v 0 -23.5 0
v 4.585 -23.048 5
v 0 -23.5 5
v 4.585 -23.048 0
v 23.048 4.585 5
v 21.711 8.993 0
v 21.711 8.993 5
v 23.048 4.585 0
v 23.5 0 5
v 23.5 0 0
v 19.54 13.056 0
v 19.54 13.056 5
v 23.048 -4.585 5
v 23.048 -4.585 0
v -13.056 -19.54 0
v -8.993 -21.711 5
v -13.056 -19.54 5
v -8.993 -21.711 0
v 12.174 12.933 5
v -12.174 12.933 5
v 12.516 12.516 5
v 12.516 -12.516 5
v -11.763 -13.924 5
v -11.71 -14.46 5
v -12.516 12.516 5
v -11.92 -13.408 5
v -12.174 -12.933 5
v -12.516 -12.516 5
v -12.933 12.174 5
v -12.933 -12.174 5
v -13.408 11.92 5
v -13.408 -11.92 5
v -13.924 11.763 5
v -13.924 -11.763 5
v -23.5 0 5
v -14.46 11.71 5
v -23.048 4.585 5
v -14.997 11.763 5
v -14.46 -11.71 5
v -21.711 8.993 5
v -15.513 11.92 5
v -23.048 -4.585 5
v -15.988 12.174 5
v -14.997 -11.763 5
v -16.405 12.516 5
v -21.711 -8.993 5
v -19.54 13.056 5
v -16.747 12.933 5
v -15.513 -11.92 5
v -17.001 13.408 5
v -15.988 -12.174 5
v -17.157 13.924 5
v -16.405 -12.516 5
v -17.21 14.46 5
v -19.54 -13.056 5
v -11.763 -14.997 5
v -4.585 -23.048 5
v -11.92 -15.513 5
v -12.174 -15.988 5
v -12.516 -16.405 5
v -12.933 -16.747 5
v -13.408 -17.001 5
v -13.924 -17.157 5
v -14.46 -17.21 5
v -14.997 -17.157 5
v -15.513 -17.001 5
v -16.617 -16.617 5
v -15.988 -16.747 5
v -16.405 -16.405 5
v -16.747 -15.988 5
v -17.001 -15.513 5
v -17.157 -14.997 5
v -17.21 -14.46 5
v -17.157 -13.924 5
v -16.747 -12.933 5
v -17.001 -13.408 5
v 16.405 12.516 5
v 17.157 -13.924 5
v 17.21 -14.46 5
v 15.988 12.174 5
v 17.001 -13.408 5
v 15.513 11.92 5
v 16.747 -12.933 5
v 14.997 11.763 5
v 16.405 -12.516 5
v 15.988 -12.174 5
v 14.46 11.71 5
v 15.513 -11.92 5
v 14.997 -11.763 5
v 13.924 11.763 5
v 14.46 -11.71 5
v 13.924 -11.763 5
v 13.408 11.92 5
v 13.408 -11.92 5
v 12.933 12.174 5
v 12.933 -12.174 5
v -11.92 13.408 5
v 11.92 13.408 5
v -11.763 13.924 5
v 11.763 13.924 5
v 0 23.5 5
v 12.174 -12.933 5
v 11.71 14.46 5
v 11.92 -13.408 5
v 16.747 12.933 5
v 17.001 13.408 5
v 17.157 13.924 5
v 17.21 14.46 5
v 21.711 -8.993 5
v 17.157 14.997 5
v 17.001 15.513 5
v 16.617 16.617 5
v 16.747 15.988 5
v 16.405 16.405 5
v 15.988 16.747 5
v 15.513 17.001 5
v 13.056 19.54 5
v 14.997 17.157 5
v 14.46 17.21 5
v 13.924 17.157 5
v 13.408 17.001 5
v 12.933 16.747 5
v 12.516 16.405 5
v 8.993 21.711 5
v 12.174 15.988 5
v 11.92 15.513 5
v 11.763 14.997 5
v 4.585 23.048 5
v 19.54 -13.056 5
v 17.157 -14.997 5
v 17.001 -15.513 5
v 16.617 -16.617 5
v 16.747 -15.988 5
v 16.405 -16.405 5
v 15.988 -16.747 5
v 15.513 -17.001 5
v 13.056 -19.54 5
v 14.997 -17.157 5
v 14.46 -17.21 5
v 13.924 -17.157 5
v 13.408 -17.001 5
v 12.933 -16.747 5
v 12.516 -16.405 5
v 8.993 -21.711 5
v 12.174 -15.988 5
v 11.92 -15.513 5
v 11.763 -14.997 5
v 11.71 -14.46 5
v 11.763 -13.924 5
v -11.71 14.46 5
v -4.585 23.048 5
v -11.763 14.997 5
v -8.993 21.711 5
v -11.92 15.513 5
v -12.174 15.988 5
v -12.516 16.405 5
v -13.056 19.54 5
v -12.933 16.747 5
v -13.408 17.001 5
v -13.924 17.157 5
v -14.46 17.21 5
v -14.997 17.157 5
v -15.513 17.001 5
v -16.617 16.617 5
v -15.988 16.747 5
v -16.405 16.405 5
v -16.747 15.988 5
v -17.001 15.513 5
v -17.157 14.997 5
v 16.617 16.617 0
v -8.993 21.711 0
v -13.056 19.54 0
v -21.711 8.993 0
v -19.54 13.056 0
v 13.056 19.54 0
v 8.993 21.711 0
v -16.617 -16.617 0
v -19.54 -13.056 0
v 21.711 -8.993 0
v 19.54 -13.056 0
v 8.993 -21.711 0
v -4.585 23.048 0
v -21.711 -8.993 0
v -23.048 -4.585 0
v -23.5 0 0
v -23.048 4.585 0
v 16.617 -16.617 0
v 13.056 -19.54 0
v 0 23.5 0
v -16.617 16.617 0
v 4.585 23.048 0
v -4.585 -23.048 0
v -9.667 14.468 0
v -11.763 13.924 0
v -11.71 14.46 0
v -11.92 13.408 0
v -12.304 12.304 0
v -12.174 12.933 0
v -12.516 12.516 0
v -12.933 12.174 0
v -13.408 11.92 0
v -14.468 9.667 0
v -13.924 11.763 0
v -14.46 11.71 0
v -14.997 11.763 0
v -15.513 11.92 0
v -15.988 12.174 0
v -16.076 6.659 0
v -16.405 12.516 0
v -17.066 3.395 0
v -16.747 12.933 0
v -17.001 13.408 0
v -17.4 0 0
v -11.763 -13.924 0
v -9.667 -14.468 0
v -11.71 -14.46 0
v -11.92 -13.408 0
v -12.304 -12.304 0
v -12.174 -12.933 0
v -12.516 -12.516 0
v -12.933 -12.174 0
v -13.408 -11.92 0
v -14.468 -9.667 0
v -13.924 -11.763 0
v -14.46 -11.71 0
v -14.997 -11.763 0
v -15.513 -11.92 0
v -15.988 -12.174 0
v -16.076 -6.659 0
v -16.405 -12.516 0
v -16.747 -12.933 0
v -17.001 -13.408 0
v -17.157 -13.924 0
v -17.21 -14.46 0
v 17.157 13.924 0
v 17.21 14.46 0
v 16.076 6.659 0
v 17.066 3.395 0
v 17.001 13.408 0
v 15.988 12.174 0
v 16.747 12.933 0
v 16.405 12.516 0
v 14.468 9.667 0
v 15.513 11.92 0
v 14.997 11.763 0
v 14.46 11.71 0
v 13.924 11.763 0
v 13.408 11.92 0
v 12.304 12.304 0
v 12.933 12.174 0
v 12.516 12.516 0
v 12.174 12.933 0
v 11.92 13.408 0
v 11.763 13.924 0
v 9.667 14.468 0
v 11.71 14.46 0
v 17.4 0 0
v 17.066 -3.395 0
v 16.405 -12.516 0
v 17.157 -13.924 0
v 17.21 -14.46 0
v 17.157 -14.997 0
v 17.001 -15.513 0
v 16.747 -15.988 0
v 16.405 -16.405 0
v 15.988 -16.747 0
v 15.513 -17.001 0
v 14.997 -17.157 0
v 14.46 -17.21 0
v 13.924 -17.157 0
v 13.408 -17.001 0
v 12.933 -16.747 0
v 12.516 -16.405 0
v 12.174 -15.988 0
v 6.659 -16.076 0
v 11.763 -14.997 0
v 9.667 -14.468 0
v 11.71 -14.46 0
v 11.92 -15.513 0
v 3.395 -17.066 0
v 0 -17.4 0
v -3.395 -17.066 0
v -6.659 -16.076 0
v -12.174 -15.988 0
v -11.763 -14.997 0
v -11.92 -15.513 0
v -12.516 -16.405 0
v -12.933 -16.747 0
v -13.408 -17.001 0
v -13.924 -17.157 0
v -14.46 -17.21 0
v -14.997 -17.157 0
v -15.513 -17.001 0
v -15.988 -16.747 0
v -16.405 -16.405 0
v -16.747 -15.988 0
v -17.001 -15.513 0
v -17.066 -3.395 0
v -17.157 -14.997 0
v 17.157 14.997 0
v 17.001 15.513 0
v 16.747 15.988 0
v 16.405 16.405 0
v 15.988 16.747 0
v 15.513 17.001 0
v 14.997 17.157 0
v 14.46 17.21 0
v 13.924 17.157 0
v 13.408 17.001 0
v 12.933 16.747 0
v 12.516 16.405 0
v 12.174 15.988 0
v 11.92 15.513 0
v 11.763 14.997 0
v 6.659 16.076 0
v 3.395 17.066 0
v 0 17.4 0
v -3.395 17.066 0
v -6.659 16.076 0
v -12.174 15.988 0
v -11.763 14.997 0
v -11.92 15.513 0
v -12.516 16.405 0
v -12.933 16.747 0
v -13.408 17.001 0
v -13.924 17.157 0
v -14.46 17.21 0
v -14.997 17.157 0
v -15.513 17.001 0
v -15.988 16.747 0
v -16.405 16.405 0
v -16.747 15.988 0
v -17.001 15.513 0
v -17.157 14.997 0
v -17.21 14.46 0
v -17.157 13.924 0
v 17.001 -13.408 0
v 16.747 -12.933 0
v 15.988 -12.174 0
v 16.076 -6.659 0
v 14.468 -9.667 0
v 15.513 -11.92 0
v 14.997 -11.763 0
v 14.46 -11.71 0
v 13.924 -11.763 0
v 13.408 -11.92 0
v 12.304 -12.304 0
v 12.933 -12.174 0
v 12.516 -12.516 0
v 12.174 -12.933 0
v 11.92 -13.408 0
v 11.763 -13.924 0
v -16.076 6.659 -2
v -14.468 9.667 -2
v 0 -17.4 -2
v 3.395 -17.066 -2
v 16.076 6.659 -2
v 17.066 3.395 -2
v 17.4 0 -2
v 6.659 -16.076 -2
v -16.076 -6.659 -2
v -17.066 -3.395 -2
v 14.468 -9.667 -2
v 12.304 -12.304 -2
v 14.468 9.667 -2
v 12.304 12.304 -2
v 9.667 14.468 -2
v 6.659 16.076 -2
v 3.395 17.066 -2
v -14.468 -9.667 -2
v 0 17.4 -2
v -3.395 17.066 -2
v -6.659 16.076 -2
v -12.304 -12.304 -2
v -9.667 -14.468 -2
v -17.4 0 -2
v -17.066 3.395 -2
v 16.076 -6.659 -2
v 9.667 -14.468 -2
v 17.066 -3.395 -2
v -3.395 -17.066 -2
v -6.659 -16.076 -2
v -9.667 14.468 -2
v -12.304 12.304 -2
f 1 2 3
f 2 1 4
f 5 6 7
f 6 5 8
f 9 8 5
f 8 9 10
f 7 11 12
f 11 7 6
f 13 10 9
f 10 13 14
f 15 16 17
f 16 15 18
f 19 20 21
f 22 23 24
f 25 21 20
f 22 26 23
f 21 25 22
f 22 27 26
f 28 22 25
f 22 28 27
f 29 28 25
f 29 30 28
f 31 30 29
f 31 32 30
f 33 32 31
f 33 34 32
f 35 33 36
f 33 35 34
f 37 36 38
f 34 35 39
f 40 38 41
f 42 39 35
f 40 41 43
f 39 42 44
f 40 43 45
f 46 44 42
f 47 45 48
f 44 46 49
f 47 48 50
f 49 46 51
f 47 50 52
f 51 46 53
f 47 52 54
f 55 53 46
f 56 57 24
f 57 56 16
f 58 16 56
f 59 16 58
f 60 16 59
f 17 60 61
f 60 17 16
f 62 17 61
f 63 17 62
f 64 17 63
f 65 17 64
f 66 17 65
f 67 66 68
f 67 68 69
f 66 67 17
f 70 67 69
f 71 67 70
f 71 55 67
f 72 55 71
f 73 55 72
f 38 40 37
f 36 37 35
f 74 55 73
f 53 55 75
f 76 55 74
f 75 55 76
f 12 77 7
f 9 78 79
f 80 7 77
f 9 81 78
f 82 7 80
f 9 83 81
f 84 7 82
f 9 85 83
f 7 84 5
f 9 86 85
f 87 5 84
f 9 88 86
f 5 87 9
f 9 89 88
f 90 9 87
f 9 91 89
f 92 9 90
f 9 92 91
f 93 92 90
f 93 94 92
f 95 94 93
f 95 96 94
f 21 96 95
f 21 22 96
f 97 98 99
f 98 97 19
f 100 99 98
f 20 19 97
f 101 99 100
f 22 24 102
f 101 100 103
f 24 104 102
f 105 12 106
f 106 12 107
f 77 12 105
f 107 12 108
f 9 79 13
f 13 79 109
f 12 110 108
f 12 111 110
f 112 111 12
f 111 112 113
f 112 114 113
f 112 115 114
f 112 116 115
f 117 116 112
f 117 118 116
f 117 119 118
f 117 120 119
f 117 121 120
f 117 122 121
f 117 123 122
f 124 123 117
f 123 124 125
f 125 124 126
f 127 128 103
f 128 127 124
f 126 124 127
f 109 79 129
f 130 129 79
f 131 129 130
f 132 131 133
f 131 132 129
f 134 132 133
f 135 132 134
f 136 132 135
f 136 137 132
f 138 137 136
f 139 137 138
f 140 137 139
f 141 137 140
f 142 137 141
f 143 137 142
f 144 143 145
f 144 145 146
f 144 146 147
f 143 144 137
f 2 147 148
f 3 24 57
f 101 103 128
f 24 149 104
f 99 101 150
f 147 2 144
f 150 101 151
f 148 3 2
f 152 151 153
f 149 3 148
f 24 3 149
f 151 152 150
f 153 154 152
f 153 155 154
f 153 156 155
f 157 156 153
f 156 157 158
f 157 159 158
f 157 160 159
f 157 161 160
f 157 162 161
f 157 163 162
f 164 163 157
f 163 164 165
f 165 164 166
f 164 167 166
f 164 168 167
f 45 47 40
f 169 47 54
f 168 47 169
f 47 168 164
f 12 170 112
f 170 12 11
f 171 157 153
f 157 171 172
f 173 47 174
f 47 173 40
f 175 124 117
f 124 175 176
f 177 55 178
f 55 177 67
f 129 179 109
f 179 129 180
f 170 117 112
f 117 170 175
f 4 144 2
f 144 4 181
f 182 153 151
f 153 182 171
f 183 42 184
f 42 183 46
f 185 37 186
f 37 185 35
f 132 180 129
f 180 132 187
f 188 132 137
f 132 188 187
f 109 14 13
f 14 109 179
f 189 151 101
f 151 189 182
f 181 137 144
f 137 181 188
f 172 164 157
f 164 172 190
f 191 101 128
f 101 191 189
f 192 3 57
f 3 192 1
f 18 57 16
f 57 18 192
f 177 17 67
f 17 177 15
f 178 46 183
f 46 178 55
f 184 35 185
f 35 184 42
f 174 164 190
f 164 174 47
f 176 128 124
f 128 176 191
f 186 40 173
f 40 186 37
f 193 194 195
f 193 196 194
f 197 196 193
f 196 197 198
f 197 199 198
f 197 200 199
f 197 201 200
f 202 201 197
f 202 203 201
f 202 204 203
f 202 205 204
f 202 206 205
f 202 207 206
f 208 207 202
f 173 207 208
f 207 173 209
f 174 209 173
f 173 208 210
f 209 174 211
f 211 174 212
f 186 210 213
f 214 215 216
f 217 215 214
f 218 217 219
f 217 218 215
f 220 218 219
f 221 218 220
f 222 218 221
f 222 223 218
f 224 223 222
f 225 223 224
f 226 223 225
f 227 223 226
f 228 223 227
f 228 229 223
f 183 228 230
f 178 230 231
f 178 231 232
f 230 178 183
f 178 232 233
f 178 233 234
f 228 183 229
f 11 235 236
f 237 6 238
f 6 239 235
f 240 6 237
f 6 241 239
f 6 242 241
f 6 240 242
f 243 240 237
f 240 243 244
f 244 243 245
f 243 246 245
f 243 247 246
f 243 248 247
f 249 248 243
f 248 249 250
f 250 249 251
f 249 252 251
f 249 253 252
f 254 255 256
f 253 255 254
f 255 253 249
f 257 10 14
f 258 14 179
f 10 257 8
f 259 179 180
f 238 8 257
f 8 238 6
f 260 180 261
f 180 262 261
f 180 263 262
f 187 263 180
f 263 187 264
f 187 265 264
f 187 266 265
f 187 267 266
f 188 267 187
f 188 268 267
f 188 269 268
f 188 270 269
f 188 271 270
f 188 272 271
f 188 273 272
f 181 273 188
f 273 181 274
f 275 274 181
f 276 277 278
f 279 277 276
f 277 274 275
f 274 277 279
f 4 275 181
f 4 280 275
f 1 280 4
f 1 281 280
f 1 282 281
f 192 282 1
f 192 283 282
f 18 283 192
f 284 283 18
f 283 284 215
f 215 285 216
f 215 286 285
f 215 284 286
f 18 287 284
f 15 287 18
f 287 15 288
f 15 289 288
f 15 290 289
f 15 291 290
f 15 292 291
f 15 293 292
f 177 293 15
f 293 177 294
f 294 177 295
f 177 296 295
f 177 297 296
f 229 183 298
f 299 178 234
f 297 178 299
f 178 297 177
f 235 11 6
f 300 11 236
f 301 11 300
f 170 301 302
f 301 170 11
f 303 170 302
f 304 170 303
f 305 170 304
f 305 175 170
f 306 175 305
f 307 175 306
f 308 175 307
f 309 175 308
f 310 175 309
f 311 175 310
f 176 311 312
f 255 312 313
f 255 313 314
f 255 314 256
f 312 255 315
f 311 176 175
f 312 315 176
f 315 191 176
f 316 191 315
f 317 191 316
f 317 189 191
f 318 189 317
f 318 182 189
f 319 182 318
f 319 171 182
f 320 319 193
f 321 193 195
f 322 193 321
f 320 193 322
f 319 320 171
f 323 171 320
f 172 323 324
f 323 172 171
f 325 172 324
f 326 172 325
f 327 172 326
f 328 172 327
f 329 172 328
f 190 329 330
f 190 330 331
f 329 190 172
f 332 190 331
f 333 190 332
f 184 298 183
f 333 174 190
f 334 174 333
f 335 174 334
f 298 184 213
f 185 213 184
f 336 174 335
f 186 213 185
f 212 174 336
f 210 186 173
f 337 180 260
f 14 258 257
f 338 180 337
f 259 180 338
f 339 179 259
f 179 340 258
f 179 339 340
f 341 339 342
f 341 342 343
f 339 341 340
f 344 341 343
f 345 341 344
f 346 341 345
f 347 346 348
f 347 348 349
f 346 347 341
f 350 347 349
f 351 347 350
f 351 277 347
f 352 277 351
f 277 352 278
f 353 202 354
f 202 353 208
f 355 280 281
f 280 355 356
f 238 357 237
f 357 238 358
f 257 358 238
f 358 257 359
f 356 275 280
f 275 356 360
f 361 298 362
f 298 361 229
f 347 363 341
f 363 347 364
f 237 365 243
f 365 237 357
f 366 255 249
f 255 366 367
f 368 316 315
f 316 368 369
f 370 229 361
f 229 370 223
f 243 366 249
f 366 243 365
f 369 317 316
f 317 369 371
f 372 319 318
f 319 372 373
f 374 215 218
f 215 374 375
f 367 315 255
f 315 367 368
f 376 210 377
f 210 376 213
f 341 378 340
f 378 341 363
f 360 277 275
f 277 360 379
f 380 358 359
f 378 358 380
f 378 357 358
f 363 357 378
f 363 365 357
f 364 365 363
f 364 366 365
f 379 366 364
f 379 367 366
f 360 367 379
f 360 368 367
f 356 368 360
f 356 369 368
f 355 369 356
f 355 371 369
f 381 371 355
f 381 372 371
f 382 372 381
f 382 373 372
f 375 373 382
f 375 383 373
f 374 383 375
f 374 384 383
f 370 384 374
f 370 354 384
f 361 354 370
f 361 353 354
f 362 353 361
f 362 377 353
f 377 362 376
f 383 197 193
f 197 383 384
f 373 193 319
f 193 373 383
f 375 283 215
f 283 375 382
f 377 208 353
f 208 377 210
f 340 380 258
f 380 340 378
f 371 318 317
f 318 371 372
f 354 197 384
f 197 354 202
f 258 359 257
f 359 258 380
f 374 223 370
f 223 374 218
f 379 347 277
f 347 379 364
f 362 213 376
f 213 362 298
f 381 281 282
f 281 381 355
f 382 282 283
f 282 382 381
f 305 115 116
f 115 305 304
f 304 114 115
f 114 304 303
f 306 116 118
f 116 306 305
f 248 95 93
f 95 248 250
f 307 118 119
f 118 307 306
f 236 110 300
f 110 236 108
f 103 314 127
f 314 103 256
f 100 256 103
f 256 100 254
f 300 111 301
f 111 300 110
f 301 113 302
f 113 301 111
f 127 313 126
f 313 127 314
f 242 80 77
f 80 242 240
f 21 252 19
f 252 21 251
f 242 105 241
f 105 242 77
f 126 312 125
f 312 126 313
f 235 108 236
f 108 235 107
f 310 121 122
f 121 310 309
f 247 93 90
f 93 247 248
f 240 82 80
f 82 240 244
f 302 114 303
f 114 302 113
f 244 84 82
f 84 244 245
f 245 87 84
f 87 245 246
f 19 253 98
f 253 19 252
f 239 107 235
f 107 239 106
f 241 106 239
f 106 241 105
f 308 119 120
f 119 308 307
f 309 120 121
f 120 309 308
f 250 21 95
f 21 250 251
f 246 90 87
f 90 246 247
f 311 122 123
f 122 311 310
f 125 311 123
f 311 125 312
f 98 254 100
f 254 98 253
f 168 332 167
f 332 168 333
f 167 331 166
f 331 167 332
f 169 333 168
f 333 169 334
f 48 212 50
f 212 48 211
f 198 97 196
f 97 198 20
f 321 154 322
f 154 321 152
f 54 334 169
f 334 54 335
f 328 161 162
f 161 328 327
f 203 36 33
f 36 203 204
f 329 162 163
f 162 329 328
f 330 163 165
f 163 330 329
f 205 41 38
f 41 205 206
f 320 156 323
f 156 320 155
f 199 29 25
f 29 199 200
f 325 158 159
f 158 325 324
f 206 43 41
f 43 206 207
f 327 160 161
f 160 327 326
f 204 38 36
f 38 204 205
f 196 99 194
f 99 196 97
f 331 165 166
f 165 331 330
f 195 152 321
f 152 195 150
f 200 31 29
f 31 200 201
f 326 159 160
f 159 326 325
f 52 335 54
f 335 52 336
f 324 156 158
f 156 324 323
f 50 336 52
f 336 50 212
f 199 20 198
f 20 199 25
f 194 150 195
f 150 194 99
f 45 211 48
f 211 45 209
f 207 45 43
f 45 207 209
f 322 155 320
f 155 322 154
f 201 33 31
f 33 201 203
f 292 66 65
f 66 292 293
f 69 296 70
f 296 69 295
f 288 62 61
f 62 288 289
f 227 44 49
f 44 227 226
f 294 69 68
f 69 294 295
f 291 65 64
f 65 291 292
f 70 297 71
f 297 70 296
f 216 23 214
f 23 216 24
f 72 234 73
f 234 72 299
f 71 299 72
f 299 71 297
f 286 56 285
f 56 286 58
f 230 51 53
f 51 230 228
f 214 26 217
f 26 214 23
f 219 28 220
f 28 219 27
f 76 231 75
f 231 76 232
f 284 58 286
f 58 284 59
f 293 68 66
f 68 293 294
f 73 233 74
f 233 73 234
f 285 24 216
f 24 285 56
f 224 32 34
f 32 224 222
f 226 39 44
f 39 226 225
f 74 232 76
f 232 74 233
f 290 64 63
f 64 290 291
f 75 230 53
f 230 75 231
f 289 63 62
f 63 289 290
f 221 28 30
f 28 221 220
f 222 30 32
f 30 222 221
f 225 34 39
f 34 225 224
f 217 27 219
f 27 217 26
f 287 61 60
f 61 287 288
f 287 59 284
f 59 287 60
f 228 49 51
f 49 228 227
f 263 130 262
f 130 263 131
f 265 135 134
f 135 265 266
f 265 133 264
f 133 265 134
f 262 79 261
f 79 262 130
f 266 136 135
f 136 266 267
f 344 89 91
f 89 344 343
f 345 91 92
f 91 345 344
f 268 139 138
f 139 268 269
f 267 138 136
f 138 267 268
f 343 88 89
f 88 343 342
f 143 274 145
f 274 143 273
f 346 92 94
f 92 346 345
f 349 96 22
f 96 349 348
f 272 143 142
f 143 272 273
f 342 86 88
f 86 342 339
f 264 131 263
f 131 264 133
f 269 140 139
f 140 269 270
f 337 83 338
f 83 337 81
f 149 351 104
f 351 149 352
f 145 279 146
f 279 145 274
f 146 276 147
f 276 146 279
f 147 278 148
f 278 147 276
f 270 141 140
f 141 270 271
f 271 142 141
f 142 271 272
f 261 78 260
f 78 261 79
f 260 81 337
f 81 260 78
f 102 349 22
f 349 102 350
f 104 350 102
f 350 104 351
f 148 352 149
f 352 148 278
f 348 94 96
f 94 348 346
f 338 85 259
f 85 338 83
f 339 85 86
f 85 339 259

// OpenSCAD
$fn = 32;

// ----------------------------------------------------------------------
// Retaining cap: 6202 cover, 47 mm, spigot 34.8 mm
// ----------------------------------------------------------------------

// --- parameters (mm) ---
plate_d = 47;             // cover diameter
plate_t = 5;              // cover thickness
boss_d = 34.8;            // spigot that enters the housing
boss_h = 2;               // spigot height
bolt_d = 5.5;             // bolt clearance
bolt_r = 20.45;           // bolt circle radius

module cover() {
  cylinder(h = plate_t, d = plate_d);
}

module spigot() {
  /* sunk 1 mm into the cover; the spigot sets the overall height */
  translate([0, 0, -boss_h]) cylinder(h = boss_h + 1, d = boss_d);
}

difference() {
  union() {
    cover();
    spigot();
  }
  for (i = [0 : 3]) rotate([0, 0, 45 + i * 90]) translate([bolt_r, 0, -boss_h - 1])
    cylinder(h = boss_h + plate_t + 2, d = bolt_d);
}
